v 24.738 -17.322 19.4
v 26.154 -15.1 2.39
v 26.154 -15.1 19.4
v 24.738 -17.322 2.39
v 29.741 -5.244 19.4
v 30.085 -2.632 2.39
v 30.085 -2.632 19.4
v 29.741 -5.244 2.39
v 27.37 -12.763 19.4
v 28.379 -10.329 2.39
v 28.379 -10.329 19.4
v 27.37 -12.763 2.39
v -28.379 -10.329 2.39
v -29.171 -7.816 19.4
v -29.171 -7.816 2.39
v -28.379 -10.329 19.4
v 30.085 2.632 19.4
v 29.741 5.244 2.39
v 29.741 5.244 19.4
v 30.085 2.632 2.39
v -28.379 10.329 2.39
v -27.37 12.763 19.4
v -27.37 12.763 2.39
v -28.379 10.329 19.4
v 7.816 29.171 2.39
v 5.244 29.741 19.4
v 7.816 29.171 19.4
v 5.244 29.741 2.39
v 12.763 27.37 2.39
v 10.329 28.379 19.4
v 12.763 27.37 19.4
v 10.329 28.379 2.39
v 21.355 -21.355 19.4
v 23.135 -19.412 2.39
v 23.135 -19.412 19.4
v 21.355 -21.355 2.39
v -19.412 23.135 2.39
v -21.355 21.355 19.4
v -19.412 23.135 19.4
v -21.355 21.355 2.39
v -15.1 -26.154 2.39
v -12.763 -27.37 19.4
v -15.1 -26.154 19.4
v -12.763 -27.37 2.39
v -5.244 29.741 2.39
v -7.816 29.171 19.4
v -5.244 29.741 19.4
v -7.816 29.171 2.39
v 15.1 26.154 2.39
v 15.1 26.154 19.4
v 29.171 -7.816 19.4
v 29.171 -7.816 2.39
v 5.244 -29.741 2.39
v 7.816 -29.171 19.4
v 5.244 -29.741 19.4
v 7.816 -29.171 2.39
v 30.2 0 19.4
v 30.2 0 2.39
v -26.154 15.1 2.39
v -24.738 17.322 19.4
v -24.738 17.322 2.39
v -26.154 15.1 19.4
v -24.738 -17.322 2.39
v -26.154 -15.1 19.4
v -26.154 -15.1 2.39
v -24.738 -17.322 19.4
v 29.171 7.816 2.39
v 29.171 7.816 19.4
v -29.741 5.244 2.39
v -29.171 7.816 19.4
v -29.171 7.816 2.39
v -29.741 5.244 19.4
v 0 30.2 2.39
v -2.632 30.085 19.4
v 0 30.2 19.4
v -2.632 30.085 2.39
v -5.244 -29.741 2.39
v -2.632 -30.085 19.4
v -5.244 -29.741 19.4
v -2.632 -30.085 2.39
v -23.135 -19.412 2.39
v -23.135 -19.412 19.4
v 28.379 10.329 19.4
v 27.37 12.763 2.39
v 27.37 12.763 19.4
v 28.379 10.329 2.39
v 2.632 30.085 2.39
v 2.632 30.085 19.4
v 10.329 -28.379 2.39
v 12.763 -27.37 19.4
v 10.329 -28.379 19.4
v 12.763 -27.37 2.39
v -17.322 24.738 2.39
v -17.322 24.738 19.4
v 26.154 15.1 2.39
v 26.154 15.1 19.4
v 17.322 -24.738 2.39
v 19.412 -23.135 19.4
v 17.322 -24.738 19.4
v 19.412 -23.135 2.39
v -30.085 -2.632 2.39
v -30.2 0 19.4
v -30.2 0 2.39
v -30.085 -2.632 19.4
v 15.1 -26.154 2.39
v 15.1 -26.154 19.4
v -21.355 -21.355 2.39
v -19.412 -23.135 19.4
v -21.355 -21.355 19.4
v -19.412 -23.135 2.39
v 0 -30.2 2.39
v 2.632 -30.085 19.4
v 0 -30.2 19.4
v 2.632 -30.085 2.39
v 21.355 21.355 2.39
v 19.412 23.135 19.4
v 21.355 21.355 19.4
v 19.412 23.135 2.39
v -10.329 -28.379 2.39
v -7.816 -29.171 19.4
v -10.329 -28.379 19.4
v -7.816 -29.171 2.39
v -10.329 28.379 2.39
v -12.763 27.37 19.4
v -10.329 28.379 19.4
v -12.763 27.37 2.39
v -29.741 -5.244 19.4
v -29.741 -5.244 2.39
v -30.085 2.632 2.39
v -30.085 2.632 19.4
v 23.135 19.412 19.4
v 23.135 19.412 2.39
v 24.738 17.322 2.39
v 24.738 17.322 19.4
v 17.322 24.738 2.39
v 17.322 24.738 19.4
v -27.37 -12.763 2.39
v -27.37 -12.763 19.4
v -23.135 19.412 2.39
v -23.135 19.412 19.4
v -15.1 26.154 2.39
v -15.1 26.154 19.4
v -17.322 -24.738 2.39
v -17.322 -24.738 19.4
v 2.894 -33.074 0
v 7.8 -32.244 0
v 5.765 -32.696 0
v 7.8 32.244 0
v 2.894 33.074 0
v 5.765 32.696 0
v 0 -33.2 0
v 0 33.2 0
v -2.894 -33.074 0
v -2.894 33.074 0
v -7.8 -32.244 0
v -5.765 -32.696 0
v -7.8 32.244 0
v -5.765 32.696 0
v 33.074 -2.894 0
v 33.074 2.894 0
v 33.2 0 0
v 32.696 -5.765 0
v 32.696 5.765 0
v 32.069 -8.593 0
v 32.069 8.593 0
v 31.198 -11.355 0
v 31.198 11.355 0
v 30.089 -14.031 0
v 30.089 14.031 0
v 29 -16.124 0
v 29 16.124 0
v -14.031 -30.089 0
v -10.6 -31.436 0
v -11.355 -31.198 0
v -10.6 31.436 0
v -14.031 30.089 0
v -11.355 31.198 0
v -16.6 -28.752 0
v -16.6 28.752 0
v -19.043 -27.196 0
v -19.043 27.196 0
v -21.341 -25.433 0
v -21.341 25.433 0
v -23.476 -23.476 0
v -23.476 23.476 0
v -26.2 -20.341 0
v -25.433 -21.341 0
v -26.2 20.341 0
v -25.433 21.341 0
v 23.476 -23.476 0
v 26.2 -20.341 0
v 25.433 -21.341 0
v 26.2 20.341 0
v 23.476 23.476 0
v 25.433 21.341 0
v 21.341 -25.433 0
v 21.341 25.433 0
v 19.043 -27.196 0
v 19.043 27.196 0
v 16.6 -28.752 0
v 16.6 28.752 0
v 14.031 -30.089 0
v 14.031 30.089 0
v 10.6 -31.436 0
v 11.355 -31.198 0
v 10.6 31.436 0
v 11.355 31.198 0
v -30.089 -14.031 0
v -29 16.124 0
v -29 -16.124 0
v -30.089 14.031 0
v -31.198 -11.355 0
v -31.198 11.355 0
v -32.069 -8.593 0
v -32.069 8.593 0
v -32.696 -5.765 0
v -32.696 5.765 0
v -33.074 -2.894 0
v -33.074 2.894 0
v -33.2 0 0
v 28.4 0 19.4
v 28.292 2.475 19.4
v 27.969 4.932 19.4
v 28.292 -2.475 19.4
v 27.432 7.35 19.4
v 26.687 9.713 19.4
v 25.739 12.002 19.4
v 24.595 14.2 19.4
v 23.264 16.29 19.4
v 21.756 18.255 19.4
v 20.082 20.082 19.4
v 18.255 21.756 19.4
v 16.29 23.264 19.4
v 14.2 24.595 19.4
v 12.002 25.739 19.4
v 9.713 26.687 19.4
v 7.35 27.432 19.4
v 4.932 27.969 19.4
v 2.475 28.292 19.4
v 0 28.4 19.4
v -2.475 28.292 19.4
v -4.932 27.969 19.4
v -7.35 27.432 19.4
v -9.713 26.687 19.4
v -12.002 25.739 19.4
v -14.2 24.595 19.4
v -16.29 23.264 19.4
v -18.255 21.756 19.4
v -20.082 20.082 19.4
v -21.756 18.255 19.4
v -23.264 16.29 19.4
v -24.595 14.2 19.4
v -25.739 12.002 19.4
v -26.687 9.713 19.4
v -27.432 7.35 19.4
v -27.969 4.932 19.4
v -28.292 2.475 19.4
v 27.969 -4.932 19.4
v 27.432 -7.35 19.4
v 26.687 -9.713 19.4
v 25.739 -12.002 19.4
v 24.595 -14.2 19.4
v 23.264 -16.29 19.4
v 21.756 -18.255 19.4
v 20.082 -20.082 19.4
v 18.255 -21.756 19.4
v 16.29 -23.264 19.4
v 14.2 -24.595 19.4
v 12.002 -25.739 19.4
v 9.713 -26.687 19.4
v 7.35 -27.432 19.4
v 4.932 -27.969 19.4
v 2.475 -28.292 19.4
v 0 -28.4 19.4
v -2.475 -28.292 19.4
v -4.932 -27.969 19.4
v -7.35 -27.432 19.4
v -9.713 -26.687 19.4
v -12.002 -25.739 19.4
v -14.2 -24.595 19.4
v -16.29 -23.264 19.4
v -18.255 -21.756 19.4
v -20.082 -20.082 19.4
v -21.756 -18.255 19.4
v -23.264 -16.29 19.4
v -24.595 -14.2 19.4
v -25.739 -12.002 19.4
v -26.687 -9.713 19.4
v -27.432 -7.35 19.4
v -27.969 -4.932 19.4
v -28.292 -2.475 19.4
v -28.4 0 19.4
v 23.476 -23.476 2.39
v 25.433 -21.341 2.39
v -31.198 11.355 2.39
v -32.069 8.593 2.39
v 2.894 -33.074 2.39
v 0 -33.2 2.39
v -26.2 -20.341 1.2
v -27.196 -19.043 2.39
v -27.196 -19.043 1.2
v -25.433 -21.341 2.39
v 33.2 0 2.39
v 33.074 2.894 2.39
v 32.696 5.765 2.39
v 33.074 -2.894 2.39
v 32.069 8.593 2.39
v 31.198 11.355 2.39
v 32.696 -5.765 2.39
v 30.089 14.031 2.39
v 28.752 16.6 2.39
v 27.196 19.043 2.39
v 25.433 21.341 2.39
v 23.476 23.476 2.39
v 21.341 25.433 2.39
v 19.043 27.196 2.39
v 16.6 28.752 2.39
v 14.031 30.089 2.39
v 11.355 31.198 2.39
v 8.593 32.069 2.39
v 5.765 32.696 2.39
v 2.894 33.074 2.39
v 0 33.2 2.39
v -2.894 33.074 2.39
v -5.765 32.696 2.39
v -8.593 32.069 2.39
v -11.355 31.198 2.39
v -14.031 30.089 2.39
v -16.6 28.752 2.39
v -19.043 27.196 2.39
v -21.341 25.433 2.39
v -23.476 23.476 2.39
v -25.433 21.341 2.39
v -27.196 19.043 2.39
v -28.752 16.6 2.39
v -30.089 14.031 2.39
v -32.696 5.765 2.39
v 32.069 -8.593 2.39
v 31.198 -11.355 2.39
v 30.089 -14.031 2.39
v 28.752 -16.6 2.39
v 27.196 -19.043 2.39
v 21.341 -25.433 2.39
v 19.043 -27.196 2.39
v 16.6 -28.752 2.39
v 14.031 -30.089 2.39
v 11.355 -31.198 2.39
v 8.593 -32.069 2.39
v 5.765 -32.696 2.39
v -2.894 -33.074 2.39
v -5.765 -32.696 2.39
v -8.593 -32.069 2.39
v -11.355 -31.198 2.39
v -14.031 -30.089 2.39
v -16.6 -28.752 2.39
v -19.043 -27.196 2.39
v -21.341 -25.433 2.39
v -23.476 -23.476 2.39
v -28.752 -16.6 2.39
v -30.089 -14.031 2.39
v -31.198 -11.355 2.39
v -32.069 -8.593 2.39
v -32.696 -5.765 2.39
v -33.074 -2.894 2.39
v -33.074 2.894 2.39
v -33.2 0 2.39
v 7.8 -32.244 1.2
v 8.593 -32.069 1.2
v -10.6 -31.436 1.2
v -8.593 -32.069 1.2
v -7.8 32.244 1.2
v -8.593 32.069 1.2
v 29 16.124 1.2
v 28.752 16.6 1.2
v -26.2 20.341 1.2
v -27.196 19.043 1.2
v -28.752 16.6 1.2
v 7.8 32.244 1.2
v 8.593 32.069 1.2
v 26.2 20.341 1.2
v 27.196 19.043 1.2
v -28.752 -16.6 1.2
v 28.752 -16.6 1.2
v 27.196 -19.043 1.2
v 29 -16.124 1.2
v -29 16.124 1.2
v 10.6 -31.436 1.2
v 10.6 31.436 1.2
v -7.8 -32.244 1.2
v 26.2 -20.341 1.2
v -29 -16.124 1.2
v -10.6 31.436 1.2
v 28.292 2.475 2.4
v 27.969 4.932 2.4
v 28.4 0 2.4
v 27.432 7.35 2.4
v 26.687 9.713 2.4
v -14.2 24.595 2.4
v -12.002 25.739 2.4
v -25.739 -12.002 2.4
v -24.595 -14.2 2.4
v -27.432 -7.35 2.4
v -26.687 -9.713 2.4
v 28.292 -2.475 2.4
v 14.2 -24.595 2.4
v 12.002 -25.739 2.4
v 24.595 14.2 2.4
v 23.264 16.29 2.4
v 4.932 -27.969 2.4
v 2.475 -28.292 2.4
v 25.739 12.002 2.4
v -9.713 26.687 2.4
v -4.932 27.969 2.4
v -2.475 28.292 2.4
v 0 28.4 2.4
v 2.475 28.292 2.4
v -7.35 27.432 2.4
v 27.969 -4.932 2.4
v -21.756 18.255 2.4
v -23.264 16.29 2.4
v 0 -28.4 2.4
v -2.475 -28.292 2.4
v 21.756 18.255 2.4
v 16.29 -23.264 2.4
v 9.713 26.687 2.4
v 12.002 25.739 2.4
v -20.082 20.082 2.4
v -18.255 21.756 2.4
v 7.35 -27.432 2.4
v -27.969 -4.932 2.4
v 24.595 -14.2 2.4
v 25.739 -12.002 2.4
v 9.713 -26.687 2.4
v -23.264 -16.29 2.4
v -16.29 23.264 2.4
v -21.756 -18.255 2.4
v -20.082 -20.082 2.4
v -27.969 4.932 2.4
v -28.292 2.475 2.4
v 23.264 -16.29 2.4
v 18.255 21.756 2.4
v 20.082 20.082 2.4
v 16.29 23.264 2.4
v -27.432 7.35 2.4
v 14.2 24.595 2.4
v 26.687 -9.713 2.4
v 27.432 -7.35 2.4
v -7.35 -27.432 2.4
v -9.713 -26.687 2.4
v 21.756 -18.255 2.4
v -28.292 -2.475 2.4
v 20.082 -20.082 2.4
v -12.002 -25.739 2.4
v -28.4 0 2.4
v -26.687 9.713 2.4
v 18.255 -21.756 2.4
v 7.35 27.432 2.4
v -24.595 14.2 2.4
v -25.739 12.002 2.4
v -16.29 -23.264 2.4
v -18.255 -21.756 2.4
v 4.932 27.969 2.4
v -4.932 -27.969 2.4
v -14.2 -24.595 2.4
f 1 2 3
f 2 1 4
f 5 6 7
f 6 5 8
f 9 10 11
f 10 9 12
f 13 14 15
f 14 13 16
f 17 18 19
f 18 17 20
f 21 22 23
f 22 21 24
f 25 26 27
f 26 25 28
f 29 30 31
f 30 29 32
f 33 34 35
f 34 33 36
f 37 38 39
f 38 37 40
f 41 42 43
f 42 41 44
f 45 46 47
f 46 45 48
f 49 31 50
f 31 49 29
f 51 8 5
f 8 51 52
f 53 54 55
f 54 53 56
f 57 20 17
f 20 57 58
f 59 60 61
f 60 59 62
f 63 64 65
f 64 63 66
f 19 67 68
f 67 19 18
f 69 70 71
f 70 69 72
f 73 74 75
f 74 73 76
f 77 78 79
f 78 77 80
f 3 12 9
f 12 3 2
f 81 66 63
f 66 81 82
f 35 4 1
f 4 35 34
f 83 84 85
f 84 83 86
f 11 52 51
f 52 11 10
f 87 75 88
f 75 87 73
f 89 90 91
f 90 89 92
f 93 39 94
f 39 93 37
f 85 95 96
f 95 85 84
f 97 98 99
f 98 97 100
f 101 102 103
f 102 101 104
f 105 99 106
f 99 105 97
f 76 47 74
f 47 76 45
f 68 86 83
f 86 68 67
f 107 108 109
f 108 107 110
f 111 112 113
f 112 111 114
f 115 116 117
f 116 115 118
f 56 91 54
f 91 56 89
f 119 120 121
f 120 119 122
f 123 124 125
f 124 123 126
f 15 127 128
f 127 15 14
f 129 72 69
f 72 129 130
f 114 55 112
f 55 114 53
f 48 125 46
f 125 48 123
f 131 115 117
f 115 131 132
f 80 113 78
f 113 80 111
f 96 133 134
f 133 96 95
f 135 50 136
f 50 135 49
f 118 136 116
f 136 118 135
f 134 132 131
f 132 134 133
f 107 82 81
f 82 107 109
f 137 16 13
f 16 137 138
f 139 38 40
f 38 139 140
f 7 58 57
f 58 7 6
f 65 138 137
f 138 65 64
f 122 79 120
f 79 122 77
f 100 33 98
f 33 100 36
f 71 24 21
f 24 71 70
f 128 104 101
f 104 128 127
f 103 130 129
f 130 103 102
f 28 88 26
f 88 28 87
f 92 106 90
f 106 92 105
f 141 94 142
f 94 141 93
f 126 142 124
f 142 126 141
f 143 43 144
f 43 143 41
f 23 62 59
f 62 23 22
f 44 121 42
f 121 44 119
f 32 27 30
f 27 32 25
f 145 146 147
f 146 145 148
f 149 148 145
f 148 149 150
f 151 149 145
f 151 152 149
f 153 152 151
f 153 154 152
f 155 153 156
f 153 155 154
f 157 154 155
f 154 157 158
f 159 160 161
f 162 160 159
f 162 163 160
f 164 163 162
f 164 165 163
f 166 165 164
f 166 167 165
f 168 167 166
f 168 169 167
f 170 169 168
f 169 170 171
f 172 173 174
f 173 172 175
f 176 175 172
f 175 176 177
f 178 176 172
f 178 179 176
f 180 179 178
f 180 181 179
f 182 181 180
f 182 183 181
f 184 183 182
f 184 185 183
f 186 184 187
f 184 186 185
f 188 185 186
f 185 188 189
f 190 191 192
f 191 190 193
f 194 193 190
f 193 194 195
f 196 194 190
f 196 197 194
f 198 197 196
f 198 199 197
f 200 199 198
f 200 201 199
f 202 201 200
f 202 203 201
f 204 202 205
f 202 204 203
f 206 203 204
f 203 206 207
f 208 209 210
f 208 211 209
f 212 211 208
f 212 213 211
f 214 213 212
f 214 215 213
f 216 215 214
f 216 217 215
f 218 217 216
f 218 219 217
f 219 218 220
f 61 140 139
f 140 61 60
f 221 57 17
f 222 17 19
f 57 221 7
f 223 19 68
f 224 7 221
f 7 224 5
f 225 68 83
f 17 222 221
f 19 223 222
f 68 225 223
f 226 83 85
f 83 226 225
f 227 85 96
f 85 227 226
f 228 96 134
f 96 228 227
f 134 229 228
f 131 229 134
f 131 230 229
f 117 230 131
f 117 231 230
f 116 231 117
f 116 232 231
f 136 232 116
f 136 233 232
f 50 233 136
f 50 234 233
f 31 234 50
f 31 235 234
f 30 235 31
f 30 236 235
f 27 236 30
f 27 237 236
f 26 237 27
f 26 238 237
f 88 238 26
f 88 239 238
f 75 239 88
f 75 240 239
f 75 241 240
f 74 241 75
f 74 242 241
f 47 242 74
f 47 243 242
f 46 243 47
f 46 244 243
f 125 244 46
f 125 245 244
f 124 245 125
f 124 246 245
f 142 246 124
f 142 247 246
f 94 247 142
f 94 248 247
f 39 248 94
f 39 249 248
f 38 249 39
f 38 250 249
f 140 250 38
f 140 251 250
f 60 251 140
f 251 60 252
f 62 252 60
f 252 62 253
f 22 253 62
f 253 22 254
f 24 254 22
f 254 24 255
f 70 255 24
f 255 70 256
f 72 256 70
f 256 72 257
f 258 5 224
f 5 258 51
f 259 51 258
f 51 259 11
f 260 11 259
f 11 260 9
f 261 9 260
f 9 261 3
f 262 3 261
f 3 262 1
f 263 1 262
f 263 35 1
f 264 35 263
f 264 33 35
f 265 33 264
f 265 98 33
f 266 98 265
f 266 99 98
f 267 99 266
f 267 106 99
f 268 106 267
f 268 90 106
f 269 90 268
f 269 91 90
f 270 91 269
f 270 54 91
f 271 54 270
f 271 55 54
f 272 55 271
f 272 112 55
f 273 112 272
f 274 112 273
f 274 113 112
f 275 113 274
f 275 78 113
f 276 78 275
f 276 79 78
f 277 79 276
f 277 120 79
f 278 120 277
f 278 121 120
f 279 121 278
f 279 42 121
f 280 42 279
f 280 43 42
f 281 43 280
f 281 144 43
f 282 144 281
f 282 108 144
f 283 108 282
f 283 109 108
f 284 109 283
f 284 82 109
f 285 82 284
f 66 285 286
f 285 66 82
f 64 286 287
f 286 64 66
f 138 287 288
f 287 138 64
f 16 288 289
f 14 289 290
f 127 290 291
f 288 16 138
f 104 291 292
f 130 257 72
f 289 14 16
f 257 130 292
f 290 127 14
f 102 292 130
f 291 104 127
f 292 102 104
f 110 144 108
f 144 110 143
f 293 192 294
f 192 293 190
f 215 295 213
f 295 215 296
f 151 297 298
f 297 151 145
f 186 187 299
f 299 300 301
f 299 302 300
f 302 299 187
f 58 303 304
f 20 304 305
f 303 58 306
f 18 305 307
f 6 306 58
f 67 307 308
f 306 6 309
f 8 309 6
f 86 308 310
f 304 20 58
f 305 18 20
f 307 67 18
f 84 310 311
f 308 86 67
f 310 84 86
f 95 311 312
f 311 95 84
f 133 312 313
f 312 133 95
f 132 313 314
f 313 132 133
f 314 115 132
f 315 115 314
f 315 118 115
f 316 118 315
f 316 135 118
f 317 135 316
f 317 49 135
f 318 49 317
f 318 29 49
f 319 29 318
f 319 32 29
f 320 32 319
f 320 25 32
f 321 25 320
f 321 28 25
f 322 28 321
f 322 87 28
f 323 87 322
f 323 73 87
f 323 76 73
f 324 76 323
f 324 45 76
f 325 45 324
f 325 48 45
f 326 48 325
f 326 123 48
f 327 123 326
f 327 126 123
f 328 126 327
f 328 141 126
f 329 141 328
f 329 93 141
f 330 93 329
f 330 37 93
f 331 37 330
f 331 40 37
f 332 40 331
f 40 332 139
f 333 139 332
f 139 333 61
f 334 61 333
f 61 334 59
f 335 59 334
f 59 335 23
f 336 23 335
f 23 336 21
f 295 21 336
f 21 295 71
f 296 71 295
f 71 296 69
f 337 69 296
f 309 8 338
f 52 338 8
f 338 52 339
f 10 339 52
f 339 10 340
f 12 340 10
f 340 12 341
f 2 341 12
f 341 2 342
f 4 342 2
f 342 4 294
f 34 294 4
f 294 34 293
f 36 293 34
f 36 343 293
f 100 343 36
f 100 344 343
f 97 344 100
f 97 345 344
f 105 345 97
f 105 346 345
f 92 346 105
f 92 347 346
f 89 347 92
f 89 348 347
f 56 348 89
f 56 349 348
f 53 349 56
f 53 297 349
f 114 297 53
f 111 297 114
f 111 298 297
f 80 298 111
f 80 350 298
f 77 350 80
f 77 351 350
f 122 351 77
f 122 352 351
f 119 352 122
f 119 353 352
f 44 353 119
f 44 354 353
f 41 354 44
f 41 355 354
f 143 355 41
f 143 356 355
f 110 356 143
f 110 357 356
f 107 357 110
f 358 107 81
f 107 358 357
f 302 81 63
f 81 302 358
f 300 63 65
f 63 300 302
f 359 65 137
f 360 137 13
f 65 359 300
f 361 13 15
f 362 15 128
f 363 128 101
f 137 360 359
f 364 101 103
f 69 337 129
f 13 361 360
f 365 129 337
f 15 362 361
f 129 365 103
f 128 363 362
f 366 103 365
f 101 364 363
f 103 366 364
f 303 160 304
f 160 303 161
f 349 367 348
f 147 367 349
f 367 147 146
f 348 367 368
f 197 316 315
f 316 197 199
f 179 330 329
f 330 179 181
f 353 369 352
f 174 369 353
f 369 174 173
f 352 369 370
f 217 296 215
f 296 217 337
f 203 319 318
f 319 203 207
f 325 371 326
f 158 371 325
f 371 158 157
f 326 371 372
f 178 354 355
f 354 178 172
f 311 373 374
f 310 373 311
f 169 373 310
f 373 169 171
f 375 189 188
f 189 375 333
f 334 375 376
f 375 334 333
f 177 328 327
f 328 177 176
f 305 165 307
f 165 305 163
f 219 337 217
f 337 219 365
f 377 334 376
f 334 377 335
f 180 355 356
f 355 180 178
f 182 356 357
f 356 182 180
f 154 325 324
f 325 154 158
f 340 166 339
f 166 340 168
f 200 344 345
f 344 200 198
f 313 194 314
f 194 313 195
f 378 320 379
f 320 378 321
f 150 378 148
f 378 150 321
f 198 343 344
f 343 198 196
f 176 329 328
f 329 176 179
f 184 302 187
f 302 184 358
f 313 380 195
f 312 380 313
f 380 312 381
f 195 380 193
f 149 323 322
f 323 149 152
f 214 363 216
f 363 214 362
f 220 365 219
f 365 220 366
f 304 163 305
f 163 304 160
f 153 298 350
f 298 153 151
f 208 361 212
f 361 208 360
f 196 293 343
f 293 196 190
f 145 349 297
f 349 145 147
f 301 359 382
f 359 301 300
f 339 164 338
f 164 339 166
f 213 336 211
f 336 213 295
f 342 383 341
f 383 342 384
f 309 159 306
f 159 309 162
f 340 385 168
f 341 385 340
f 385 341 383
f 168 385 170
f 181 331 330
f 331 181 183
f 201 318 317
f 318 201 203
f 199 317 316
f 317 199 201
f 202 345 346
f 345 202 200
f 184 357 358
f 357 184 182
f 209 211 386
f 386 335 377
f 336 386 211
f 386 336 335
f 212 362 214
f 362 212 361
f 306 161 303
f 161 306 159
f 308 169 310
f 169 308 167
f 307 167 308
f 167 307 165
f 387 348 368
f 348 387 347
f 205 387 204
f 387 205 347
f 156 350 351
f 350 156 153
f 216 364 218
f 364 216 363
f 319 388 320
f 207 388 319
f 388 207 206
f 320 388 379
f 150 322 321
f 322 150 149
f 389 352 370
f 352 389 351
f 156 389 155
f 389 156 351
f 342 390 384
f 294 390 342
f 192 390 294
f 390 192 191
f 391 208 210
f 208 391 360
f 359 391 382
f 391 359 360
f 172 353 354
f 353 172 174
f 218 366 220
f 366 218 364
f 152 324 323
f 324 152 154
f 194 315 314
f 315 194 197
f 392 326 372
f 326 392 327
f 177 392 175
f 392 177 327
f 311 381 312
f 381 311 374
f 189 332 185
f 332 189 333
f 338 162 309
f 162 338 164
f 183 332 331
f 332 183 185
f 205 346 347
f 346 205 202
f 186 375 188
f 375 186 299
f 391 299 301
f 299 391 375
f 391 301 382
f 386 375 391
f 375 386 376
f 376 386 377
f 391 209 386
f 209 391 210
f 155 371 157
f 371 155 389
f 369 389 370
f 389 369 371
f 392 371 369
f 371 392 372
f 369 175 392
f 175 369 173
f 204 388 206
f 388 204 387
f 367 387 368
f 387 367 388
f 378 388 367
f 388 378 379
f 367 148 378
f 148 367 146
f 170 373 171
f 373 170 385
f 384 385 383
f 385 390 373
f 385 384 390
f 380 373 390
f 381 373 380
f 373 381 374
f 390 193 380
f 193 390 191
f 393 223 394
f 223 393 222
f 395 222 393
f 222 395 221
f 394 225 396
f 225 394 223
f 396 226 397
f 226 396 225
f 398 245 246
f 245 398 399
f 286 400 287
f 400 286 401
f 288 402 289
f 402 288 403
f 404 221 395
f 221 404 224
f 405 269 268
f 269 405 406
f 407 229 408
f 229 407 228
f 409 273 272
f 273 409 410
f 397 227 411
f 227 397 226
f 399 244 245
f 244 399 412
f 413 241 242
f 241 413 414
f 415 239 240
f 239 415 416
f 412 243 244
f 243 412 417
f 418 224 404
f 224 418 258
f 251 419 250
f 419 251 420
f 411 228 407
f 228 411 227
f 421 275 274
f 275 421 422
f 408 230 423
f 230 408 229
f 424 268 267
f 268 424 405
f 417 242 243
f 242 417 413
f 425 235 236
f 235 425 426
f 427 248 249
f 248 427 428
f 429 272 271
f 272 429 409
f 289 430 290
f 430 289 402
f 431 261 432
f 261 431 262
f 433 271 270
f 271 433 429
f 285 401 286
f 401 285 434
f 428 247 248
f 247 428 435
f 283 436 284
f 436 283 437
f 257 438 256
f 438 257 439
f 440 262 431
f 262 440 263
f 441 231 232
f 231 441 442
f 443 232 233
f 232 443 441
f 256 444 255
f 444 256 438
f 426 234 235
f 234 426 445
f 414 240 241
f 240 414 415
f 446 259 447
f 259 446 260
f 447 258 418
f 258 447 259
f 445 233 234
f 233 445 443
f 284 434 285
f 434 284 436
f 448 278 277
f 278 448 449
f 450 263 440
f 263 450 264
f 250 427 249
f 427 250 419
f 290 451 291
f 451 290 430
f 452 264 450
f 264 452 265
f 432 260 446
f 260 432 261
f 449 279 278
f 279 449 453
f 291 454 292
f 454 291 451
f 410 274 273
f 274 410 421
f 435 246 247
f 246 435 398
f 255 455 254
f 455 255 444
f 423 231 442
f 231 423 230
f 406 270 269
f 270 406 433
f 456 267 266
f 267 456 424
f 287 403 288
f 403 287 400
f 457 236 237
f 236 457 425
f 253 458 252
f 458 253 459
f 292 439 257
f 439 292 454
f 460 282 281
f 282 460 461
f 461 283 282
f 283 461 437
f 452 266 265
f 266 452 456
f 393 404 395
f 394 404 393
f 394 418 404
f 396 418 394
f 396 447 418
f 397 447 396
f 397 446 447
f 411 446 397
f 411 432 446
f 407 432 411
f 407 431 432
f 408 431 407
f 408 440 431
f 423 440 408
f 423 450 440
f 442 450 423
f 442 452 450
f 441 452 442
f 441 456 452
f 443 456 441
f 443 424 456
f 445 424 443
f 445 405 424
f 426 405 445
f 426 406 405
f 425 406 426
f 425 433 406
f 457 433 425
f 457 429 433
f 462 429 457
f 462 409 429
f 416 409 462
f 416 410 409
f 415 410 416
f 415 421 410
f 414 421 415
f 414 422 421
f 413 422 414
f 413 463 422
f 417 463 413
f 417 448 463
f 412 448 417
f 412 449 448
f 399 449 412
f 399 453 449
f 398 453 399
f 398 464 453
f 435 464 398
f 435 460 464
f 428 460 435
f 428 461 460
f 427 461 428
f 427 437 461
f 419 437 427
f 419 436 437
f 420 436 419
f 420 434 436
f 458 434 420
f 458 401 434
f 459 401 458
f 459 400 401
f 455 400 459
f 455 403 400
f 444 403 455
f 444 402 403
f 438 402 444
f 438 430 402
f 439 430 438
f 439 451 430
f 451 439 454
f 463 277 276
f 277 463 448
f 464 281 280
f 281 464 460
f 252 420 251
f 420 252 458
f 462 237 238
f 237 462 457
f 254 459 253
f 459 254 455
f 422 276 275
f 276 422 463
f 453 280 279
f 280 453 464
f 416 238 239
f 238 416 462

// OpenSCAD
// -*- mode: SCAD ; c-file-style: "ellemtel" ; coding: utf-8 -*-
//
// A simple "coaster" to stop condiment bottles from falling over when
// placed on the bars of a the grid in the fridge
//
// Copyright 2018 Roland Sieker <ospalh@gmail.com>
// Licence: CC-BY-SA 4.0


// Set this to "render" and click on "Create Thing" when done with the setup.
preview = 1; // [0:render, 1:preview]

// Distance from one bar of the fridge shelf grid to the next. All sizes are in millimetres.
bar_spacing = 18.4;  // [5:0.1:30]
// Diameter of one shelf grid bar
bar_width = 2.8;  // [0.5:0.1:7]
// Height of the coaster pot.
pot_height = 17;  // [3:0.5:50]
// Diameter of the bottle to hold
bottle_diameter = 56;  // [10:0.1:80]
// Width of the flange. How much the bottom is wider than the pot on top.
flange = 3;  // [0:0.5:15]

// How many same sized bottles to store in a row
number_of_pots = 1;  // [1:1:10]

/* [Hidden] */

// Done with the customizer

// *******************************************************
// Extra parameters. These can be changed reasonably safely.


w = 1.8;  // Wall width
p = 1.2;  // Bottom, top plate pot_height
c = 0.4;  // Clearance
angle = 60; // Overhangs much below 60 degrees are a problem for me

// *******************************************************
// Some shortcuts. These shouldn't be changed

tau = 2 * PI;  // pi is still wrong. Tau = diameter / r

xy_factor = 1/tan(angle);
// To get from a pot_height to a horizontal width inclined correctly
z_factor = tan(angle);  // The other way around


rie = bottle_diameter/2 + c;

some_distance = 50;
ms = 0.01;  // Muggeseggele.

// fn for differently sized objects and fs, fa; all for preview or rendering.
pna = 40;
pnb = 15;
pa = 5;
ps = 1;
rna = 180;
rnb = 30;
ra = 1;
rs = 0.1;
function na() = (preview) ? pna : rna;
function nb() = (preview) ? pnb : rnb;
$fs = (preview) ? ps : rs;
$fa = (preview) ? pa : ra;

function fe() = (number_of_pots > 1) ? flange : 0;

// *******************************************************
// End setup



// *******************************************************
// Generate the parts

fridge_coaster();

// *******************************************************
// Code for the parts themselves


module fridge_coaster()
{
   hrc = ceil((rie+w+bar_width+flange)/bar_spacing) + 1;
   de = 2*rie+w;
   difference()
   {
      union()
      {
         for (o=[0:number_of_pots-1])
         {
            translate([0,o*de,0])
            {
               echo("o",o);
               cylinder(r=rie+w, h=2*p+pot_height);
            }
         }
         hull ()
         {
            translate([0, fe(), 0])
            {
               cylinder(r=rie+w+flange, h=2*p-ms);
            }
            translate([0, (number_of_pots-1)*de -fe(),0])
            {
            cylinder(r=rie+w+flange, h=2*p-ms);
            }
         }
      }
      for (o=[0:number_of_pots-1])
      {  translate([0,o*de,2*p])
         {
            cylinder(r=rie, h=pot_height+ms);
         }
      }
      for (o=[-hrc:hrc])
      {
         echo(o);
         translate([(o+0.5)*bar_spacing, (number_of_pots-1)*de*0.5, 0])
         {
            cube([bar_width, 2*(rie+w+c+bar_width+flange+ms)+(number_of_pots-1)*de, 2*p], center=true);
         }
      }
   }
}
